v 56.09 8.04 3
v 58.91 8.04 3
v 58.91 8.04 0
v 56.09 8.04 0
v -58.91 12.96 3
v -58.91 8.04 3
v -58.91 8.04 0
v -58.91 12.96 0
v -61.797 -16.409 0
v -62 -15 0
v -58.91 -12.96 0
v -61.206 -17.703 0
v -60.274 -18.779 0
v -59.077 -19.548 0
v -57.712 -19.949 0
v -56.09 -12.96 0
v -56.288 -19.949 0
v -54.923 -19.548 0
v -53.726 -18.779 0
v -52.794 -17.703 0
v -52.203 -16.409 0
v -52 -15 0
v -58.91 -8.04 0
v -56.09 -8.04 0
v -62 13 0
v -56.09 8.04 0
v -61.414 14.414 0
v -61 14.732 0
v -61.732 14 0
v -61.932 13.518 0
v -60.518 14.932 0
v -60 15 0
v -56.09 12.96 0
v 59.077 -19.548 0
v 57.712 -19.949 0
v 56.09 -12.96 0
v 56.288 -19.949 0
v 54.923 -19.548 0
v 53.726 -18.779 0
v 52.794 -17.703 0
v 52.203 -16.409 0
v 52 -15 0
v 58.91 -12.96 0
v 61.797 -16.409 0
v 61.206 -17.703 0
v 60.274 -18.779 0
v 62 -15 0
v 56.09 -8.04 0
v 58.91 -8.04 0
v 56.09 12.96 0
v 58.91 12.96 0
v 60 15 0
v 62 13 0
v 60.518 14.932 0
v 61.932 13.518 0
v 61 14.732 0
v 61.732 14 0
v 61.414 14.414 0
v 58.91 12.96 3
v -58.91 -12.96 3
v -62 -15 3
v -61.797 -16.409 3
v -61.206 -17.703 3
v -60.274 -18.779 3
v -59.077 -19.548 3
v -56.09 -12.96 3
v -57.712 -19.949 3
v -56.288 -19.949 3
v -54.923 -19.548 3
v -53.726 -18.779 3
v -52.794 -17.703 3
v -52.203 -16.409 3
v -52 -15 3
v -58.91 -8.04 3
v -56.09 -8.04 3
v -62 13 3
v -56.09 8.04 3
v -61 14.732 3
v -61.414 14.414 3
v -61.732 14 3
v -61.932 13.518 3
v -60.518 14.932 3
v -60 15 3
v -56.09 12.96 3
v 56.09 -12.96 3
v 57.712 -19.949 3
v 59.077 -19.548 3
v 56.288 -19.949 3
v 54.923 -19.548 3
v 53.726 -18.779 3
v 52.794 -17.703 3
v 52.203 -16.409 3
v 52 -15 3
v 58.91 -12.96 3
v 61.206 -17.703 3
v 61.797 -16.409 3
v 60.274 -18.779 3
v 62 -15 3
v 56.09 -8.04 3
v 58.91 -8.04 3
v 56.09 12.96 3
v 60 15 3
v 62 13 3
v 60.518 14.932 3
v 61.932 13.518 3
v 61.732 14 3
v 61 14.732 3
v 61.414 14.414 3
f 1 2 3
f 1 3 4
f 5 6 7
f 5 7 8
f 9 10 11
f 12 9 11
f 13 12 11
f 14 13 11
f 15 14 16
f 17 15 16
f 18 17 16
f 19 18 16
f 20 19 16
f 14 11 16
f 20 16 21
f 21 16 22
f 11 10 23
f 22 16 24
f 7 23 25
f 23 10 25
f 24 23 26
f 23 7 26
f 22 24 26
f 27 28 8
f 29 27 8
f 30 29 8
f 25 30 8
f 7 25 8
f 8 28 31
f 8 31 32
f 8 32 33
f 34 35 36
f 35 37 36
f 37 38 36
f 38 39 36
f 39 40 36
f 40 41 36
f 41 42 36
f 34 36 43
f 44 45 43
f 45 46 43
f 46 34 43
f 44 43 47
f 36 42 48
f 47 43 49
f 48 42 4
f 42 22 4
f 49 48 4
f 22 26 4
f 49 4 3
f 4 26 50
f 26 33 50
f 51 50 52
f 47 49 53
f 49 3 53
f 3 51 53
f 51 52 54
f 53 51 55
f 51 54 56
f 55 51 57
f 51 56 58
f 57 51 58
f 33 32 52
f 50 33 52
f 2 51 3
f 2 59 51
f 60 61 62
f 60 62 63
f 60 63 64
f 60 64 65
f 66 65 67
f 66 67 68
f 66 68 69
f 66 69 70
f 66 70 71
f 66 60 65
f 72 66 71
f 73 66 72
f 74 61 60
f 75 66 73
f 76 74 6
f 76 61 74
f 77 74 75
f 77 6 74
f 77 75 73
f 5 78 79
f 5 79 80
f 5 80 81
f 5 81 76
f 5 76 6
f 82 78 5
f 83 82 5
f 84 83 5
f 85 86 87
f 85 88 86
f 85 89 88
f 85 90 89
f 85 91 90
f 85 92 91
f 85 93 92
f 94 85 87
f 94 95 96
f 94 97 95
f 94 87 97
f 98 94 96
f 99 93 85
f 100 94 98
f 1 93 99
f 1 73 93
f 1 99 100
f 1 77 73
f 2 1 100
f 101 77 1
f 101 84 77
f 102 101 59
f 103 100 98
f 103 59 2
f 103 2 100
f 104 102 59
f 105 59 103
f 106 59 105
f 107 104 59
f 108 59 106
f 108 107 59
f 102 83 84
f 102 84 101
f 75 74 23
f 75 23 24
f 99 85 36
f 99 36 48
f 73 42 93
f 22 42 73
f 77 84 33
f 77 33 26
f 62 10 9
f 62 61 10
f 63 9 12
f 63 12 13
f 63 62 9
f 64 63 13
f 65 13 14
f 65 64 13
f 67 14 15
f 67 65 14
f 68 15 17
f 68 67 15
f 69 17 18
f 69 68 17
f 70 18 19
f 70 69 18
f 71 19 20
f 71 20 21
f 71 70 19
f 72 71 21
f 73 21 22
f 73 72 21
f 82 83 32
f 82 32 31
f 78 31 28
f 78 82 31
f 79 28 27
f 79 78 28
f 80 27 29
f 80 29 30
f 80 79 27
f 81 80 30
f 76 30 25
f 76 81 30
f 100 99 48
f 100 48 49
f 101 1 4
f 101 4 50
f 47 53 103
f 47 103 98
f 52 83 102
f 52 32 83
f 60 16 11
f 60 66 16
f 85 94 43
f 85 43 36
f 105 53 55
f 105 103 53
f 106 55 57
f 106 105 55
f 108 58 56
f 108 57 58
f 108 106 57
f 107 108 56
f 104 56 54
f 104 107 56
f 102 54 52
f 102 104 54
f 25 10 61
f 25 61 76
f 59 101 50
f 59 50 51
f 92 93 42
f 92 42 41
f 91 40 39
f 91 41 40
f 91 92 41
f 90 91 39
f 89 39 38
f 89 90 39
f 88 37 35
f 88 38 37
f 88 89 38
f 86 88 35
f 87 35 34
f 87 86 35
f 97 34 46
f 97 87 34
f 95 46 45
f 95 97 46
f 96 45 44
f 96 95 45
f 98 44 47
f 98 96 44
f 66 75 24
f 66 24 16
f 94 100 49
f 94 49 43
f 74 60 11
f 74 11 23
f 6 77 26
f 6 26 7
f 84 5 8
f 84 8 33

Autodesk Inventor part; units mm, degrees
ref_plane "YZ Plane" through (0, 0, 0) normal (1, 0, 0) x (0, 1, 0)
ref_plane "XZ Plane" through (0, 0, 0) normal (0, 1, 0) x (-1, 0, 0)
ref_plane "XY Plane" through (0, 0, 0) normal (0, 0, 1) x (1, 0, 0)
sketch "Sketch1" plane through (0, 0, 0) normal (0, 0, 1) x (1, 0, 0)
  line L0 (-62, 15) -> (62, 15)
  line L1 (62, 15) -> (62, -15)
  line L2 (62, -15) -> (-62, -15)
  line L3 (-62, -15) -> (-62, 15)
  line L4 (-62, 15) -> (62, -15) construction
  line L5 (62, 15) -> (-62, -15) construction
  point P0 (0, 0)
  dimension "d0" = 124
  dimension "d1" = 30
extrude "Extrusion1" add sketch "Sketch1" along normal blind 3
sketch "Sketch3" plane through (0, 0, 3) normal (0, 0, 1) x (1, 0, 0)
  line L0 (62, 15) -> (-62, 15) projected
  line L1 (-62, -15) -> (62, -15) projected
  arc A0 (-62, -15) -> (-52, -15) centre (-57, -15) ccw
  line L2 (-62, -15) -> (-52, -15)
  point P0 (0, 0)
extrude "Extrusion3" add sketch "Sketch3" against normal blind 3
mirror "Mirror2" about plane through (0, 0, 0) normal (1, 0, 0) of "Extrusion3"
fillet "Fillet1" radius 2 1 edges at (-62, 15, 1.5)
fillet "Fillet2" radius 2 1 edges at (62, 15, 1.5)
sketch "Sketch5" plane through (0, 0, 3) normal (0, 0, 1) x (1, 0, 0)
  line L0 (-58.91, 12.96) -> (-56.09, 12.96)
  line L1 (-56.09, 12.96) -> (-56.09, 8.04)
  line L2 (-56.09, 8.04) -> (-58.91, 8.04)
  line L3 (-58.91, 8.04) -> (-58.91, 12.96)
  line L4 (-58.91, 12.96) -> (-56.09, 8.04) construction
  line L5 (-56.09, 12.96) -> (-58.91, 8.04) construction
  line L6 (60, 15) -> (-60, 15) projected
  line L7 (-58.91, -8.04) -> (-56.09, -8.04)
  line L8 (-56.09, -8.04) -> (-56.09, -12.96)
  line L9 (-56.09, -12.96) -> (-58.91, -12.96)
  line L10 (-58.91, -12.96) -> (-58.91, -8.04)
  line L11 (-58.91, -8.04) -> (-56.09, -12.96) construction
  line L12 (-56.09, -8.04) -> (-58.91, -12.96) construction
  line L13 (-52, -15) -> (52, -15) projected
  point P0 (0, 0)
  point P1 (-57.5, 10.5)
  point P2 (-57.5, -10.5)
  point P3 (-57.5, -10.5)
  point P4 (-57.5, 10.5)
  dimension "d31" = 2.82
  dimension "d32" = 4.92
  dimension "d33" = 57.5
  dimension "d34" = 4.5
  dimension "d35" = 4.5
  dimension "d4" = 3
  dimension "d5" = 5
  dimension "d6" = 56
  dimension "d7" = 2
  dimension "d10" = 5
  dimension "d11" = 2
extrude "Extrusion5" cut sketch "Sketch5" against normal through all
mirror "Mirror3" about plane through (0, 0, 0) normal (1, 0, 0) of "Extrusion5"
equation "\"d35\" = d34"
equation "\"kerf\" = 0.13"
properties part number "BackPanel" material "Acrylic, Clear"
